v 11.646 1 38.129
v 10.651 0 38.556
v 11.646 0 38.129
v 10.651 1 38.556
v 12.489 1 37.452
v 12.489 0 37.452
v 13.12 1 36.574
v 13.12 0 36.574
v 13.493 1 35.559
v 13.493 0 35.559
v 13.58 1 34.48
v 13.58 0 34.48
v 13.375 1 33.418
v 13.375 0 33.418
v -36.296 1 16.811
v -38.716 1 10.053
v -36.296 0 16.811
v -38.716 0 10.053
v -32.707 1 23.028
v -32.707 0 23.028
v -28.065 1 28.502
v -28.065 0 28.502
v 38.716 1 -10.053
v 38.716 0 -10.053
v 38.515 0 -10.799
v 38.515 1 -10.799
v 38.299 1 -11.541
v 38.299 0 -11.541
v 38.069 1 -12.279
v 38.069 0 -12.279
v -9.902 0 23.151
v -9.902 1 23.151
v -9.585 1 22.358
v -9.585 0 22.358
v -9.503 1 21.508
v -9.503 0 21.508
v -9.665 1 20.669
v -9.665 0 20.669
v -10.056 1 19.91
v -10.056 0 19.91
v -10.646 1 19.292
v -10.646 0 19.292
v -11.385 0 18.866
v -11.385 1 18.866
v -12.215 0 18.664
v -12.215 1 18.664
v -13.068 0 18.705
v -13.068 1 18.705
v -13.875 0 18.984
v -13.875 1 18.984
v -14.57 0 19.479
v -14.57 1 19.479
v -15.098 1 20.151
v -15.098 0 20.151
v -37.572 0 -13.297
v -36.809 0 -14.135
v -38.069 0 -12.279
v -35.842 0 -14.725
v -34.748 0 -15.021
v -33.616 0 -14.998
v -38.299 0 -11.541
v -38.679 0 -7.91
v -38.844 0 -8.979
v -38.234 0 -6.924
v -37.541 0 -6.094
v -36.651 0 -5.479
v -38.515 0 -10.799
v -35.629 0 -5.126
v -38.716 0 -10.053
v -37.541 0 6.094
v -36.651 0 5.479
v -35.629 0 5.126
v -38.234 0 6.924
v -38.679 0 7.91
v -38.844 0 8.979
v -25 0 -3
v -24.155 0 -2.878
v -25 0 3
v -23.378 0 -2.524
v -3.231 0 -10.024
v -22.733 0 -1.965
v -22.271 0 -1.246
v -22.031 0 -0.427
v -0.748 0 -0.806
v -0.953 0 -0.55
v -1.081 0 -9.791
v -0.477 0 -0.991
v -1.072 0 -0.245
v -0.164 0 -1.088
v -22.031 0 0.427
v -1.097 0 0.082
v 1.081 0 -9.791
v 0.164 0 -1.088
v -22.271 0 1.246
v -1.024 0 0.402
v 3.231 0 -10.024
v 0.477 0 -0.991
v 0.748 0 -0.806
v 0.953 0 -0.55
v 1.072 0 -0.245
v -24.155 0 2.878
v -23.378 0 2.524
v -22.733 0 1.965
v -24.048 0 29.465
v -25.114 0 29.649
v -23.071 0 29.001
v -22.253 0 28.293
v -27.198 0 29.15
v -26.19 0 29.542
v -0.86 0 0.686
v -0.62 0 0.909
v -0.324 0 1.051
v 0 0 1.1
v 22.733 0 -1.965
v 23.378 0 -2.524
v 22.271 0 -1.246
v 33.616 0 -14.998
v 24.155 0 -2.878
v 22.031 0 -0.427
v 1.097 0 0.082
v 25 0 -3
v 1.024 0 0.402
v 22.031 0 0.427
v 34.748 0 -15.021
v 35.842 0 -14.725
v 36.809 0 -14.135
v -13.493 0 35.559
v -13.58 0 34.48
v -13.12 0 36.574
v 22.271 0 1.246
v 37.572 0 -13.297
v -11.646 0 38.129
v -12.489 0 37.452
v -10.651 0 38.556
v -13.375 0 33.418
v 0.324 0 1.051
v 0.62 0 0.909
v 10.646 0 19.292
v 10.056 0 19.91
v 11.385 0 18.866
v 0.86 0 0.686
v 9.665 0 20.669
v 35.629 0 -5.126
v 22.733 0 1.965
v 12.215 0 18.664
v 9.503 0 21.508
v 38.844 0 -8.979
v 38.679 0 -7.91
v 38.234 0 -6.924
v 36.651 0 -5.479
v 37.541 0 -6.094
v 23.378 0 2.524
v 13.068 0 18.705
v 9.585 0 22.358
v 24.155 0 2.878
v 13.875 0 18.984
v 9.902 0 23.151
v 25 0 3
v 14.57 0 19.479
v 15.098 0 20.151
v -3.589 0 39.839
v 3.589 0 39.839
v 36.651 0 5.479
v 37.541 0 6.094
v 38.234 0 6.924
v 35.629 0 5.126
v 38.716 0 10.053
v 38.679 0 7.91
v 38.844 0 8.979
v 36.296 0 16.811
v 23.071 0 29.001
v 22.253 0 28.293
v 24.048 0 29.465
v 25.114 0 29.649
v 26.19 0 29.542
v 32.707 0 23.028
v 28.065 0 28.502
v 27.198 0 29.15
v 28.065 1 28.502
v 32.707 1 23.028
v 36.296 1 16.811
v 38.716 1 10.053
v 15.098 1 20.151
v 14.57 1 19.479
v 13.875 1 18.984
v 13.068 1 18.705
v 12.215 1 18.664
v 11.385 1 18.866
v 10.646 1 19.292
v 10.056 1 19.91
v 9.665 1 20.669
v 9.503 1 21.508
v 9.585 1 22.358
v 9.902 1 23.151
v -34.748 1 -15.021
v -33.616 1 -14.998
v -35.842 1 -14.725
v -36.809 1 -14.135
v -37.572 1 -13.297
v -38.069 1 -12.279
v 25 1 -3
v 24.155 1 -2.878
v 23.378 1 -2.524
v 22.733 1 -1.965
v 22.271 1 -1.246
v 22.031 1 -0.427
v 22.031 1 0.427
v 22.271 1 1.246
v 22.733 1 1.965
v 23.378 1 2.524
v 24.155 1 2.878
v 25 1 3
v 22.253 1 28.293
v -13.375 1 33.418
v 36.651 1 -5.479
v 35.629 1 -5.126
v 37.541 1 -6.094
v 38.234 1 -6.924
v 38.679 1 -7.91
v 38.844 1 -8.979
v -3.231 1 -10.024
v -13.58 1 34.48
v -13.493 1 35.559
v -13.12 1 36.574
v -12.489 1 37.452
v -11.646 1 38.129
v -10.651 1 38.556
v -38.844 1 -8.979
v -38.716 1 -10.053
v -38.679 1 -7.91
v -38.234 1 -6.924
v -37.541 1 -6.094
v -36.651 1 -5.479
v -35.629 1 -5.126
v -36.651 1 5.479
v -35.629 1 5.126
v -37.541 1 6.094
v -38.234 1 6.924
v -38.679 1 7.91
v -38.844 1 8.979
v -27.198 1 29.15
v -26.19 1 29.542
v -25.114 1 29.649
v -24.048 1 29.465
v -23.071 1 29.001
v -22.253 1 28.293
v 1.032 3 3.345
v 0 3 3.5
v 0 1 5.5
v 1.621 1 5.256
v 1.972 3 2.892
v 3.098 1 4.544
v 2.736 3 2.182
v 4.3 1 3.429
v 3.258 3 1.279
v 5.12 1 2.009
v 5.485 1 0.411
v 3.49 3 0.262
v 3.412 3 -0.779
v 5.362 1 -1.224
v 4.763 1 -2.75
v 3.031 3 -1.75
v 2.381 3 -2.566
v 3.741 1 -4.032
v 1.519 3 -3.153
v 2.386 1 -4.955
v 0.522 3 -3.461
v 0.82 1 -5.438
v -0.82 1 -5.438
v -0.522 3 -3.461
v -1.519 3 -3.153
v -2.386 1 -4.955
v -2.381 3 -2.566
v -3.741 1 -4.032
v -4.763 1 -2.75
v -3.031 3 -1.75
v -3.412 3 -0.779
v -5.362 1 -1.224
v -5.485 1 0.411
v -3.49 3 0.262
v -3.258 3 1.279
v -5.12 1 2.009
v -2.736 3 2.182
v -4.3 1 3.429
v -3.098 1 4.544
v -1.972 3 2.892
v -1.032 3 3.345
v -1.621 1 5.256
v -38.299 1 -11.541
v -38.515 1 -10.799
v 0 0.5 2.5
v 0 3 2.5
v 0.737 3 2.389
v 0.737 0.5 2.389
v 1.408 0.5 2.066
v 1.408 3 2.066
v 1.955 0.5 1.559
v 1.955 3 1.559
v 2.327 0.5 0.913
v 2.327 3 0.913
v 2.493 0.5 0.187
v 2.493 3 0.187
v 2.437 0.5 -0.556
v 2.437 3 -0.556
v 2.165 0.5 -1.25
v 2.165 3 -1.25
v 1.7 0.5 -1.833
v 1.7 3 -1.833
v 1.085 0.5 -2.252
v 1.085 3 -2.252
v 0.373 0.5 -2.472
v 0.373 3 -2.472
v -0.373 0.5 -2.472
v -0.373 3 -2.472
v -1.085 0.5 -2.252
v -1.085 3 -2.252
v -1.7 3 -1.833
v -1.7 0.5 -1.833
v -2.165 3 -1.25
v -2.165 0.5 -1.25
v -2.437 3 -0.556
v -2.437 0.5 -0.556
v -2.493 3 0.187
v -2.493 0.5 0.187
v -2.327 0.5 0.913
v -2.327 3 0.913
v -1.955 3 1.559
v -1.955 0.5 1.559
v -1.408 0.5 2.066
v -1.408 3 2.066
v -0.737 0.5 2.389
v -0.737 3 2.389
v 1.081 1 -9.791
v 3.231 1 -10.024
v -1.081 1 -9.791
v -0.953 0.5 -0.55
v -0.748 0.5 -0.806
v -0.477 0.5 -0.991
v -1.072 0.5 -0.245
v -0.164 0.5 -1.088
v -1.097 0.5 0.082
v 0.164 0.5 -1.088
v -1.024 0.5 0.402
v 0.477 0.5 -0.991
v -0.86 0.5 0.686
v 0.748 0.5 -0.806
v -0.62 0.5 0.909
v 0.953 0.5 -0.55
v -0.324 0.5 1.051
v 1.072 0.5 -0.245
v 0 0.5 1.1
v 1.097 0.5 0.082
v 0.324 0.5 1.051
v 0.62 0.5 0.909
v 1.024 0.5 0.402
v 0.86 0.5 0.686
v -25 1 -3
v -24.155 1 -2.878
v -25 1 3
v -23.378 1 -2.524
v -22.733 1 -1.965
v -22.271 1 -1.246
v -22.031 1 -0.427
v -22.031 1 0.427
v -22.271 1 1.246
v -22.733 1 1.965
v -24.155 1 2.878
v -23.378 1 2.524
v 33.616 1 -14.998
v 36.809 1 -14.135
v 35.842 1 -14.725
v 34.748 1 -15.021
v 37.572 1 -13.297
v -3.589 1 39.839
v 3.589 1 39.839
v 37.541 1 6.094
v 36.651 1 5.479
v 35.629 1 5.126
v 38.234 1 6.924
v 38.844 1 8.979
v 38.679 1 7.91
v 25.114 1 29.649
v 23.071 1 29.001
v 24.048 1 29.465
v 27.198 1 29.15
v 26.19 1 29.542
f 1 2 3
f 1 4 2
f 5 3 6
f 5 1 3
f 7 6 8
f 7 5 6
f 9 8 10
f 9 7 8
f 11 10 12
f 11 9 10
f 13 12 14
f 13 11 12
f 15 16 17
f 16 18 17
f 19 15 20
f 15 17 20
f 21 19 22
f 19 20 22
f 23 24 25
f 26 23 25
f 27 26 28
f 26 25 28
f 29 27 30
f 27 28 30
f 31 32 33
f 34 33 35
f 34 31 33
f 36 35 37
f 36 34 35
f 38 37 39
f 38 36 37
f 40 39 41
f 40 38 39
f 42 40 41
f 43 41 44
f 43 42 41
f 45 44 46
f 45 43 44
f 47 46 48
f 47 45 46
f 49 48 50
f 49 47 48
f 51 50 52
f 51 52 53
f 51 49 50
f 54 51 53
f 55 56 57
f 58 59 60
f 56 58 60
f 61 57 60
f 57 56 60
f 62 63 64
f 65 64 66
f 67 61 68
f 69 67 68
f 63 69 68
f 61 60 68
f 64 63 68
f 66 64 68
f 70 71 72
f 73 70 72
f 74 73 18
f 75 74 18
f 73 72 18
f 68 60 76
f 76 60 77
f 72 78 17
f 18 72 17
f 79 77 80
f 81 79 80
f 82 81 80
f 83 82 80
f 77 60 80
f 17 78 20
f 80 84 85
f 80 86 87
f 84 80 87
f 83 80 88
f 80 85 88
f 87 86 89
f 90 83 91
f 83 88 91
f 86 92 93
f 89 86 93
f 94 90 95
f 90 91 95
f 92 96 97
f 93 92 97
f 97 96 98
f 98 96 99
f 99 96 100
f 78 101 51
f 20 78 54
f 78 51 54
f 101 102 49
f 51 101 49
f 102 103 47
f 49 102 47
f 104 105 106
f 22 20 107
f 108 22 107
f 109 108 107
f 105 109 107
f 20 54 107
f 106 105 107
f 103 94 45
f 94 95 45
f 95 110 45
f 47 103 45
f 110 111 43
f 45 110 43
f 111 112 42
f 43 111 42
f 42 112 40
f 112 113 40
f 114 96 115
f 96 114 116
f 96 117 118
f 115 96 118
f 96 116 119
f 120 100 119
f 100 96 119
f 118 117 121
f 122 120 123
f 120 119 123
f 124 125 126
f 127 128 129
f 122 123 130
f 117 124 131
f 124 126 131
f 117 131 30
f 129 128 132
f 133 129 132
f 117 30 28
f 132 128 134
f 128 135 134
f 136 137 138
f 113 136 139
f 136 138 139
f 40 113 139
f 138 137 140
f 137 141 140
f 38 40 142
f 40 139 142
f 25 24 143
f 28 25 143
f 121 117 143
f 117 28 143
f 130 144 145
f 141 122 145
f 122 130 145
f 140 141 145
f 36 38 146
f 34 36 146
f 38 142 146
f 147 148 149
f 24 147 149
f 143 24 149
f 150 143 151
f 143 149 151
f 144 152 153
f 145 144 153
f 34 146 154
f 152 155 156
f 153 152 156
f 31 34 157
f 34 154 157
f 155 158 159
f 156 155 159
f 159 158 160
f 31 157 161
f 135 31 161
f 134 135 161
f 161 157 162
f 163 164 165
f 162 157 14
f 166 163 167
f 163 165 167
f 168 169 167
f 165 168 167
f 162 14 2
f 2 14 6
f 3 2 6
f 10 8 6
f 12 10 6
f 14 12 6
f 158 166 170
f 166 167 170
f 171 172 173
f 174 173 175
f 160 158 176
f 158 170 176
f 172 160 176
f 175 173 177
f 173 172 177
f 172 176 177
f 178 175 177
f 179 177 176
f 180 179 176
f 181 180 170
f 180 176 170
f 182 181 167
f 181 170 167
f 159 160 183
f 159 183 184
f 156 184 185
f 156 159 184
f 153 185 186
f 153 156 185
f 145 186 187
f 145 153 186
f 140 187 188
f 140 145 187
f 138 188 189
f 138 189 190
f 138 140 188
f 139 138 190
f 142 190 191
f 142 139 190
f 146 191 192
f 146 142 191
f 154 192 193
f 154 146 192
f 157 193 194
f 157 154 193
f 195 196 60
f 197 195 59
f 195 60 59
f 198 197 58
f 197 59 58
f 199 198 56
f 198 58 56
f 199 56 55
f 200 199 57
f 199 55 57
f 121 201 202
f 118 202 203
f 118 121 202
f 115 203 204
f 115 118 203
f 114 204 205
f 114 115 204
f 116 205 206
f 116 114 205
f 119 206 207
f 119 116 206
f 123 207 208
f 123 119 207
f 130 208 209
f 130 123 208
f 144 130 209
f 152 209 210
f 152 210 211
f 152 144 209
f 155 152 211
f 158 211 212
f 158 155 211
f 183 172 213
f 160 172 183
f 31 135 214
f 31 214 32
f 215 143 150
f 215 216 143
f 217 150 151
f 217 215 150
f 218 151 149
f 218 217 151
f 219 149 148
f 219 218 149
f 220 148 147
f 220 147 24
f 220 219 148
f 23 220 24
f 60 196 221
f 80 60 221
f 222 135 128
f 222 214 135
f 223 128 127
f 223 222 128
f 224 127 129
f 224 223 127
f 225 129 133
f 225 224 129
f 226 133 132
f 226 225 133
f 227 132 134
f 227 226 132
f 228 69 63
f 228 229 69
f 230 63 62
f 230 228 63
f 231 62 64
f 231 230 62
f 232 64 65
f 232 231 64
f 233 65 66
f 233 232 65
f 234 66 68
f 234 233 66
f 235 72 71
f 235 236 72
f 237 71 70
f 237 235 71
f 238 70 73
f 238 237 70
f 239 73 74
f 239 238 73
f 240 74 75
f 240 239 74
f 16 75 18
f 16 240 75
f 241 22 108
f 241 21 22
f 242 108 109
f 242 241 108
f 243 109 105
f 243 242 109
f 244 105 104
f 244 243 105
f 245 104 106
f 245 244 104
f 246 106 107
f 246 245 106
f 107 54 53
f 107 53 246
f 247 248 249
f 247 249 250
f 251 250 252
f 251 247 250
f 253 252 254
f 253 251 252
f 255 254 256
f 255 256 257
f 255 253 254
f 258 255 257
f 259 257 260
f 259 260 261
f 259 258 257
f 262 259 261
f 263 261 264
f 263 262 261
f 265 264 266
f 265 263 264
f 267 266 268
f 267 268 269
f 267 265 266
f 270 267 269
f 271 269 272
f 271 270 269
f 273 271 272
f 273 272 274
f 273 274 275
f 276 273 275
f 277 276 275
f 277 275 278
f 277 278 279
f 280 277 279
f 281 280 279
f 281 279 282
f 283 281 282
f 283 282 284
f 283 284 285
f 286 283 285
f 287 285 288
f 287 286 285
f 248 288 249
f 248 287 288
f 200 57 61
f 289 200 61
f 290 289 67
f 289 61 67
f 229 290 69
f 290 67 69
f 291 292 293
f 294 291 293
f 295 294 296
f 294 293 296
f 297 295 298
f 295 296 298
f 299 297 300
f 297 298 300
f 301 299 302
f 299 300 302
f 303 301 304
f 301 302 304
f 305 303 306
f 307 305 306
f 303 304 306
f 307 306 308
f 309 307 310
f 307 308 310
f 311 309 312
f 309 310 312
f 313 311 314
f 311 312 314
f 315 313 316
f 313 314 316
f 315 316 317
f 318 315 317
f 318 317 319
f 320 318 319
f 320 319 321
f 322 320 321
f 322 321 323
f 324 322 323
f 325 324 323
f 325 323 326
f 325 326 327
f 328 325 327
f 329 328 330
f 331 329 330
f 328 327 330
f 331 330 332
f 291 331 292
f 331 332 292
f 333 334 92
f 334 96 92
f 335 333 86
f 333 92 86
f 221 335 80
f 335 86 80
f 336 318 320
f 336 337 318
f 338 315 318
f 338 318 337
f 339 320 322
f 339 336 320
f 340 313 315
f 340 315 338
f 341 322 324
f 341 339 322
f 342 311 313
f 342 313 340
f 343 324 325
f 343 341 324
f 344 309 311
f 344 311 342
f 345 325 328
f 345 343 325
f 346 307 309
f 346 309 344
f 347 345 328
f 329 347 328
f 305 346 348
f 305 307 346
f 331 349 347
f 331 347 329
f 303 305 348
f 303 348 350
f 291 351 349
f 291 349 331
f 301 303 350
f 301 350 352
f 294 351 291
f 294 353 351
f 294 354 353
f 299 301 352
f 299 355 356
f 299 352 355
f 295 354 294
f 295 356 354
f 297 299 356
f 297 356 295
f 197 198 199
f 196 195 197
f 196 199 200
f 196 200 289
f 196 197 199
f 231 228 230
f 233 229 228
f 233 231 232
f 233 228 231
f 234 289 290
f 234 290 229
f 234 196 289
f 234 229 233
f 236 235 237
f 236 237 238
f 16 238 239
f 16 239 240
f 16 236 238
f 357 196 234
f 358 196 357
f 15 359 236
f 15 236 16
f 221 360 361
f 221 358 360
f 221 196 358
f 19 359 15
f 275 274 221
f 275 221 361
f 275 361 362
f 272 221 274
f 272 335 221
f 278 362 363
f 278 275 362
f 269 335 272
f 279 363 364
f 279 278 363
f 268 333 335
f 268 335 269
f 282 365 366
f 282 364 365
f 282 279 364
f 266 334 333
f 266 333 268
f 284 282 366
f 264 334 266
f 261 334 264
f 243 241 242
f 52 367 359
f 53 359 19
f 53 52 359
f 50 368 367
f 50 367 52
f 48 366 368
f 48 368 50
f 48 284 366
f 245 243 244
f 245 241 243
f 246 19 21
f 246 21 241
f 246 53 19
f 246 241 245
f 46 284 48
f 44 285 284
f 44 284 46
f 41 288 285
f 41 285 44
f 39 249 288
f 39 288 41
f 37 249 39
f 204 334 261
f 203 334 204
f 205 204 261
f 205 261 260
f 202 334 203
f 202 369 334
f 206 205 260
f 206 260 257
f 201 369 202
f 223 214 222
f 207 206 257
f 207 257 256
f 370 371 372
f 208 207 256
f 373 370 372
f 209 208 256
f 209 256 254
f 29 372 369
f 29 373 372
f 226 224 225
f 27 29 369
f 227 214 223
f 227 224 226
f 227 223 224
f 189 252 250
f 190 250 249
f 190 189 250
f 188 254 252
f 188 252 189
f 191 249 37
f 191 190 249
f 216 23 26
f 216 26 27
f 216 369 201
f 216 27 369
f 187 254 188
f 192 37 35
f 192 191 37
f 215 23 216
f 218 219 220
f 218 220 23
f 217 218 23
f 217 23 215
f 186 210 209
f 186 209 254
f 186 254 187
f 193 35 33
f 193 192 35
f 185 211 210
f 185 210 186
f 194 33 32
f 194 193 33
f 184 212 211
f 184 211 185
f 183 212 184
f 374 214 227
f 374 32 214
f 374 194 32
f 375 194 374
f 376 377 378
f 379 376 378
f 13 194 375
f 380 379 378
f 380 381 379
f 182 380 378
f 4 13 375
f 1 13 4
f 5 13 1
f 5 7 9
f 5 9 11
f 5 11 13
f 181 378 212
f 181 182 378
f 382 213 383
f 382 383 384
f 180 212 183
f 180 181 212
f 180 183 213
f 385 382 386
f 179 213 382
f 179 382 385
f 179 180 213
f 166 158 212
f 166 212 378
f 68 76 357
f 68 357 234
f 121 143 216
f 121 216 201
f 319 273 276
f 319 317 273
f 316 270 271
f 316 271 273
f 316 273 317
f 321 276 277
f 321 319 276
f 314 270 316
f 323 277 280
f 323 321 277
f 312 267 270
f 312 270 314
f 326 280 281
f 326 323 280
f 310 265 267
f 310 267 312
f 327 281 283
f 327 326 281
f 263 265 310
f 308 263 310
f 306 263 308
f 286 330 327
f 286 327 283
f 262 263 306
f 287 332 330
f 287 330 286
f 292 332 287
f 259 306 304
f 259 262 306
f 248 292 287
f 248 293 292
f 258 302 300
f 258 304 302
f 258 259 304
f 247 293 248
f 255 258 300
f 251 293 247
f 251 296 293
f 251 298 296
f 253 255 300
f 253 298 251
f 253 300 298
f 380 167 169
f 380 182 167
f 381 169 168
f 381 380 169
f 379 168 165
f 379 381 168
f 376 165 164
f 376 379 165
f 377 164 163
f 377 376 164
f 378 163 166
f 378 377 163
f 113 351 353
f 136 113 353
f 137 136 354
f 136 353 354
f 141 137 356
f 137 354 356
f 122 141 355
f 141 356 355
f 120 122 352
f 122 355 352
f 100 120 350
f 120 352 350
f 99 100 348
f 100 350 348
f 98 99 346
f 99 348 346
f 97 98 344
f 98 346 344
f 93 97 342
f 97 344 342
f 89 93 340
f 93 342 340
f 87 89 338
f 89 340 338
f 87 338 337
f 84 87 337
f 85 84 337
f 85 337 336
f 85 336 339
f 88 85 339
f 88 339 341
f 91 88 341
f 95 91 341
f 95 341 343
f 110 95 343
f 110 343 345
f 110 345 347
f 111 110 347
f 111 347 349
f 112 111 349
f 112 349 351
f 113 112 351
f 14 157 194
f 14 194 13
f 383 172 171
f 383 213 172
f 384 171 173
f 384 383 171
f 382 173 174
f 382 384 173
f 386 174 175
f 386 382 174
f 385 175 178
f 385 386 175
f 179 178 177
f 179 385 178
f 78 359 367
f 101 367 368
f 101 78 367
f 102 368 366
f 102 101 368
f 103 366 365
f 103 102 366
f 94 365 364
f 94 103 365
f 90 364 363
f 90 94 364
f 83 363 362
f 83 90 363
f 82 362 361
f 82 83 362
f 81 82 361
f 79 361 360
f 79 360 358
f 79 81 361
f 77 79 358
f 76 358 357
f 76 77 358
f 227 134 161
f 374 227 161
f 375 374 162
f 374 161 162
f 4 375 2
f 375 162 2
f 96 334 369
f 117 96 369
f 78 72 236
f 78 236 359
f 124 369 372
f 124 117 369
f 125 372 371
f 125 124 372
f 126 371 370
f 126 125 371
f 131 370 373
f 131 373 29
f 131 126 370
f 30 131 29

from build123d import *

# Parameters (mm, degrees)
ESBO_O1_R                = 40
RESSALTO_EXTRUS_O1_DEPTH = 1
CORTE_EXTRUS_O1_START    = -10
CORTE_EXTRUS_O1_DEPTH    = 10
ESBO_O3_R                = 3.5
RESSALTO_EXTRUS_O2_DEPTH = 2
ESBO_O4_R                = 2.5
CORTE_EXTRUS_O2_DEPTH    = 2.5
CHANFRO1_SIZE            = 2
CORTE_EXTRUS_O3_DEPTH    = 3
FILETE1_R                = 4
ESBO_O6_R                = 1.1
CORTE_EXTRUS_O4_DEPTH    = 3
FILETE2_R                = 4
FILETE3_R                = 4
FILETE4_R                = 4
FILETE5_R                = 4
FILETE6_R                = 4
FILETE7_R                = 4
FILETE8_R                = 4
FILETE9_R                = 4
FILETE10_R               = 4
FILETE11_R               = 20


with BuildPart() as part:
    # Esboço1 → Ressalto-extrusão1 (new body)
    with BuildSketch(Plane(origin=(0, 0, 0), x_dir=(1, 0, 0), z_dir=(0, 1, 0))):
        with Locations(Location((0, 0, 0), (0, 0, 270))):
            Circle(ESBO_O1_R)
    extrude(amount=RESSALTO_EXTRUS_O1_DEPTH)

    # Esboço2 → Corte-extrusão1 (cut)
    with BuildSketch(Plane(origin=(0, 1, 0), x_dir=(1, 0, 0), z_dir=(0, 1, 0)).offset(CORTE_EXTRUS_O1_START)):
        with BuildLine():
            ThreePointArc((25, 3), (22, 0), (25, -3))
            Line((25, -3), (39.560670745, -5.912134149))
            ThreePointArc((39.560670745, -5.912134149), (40, 0), (39.560670745, 5.912134149))
            Line((39.560670745, 5.912134149), (25, 3))
        make_face()
        with BuildLine():
            ThreePointArc((-39.560670745, 5.912134149), (-40, 0), (-39.560670745, -5.912134149))
            Line((-39.560670745, -5.912134149), (-25, -3))
            ThreePointArc((-25, -3), (-22, 0), (-25, 3))
            Line((-25, 3), (-39.560670745, 5.912134149))
        make_face()
        with BuildLine():
            Line((9.901923789, -23.150635095), (14.660277009, -37.216612931))
            ThreePointArc((14.660277009, -37.216612931), (20, -34.641016151), (24.900393736, -31.304478782))
            Line((24.900393736, -31.304478782), (15.098076211, -20.150635095))
            ThreePointArc((15.098076211, -20.150635095), (11, -19.052558883), (9.901923789, -23.150635095))
        make_face()
        with BuildLine():
            ThreePointArc((-24.900393736, -31.304478782), (-20, -34.641016151), (-14.660277009, -37.216612931))
            Line((-14.660277009, -37.216612931), (-9.901923789, -23.150635095))
            ThreePointArc((-9.901923789, -23.150635095), (-11, -19.052558883), (-15.098076211, -20.150635095))
            Line((-15.098076211, -20.150635095), (-24.900393736, -31.304478782))
        make_face()
    extrude(amount=CORTE_EXTRUS_O1_DEPTH, mode=Mode.SUBTRACT)

    # Esboço3 → Ressalto-extrusão2 (add)
    with BuildSketch(Plane(origin=(0, 1, 0), x_dir=(1, 0, 0), z_dir=(0, 1, 0))):
        with Locations(Location((0, 0, 0), (0, 0, 270))):
            Circle(ESBO_O3_R)
    extrude(amount=RESSALTO_EXTRUS_O2_DEPTH)

    # Esboço4 → Corte-extrusão2 (cut)
    with BuildSketch(Plane(origin=(0, 3, 0), x_dir=(1, 0, 0), z_dir=(0, 1, 0))):
        with Locations(Location((0, 0, 0), (0, 0, 270))):
            Circle(ESBO_O4_R)
    extrude(amount=-CORTE_EXTRUS_O2_DEPTH, mode=Mode.SUBTRACT)

    # Chanfro1
    chanfro1_edges = [part.edges().sort_by_distance(p)[0] for p in [
        (0, 1, -3.5),
    ]]
    chamfer(chanfro1_edges, length=CHANFRO1_SIZE - 0.0001)  # a hair under: the kernel refuses the full size

    # Esboço5 → Corte-extrusão3 (cut)
    with BuildSketch(Plane(origin=(0, 1, 0), x_dir=(1, 0, 0), z_dir=(0, 1, 0))):
        Polygon((-36.862262331, 15.52976548), (0, 9.495011624), (36.862262331, 15.52976548), (36.862262331, 44.423786918), (-36.862262331, 44.423786918), align=None)
    extrude(amount=-CORTE_EXTRUS_O3_DEPTH, mode=Mode.SUBTRACT)

    # Filete1
    filete1_edges = [part.edges().sort_by_distance(p)[0] for p in [
        (36.862262331, 0.5, -15.52976548),
    ]]
    fillet(filete1_edges, radius=FILETE1_R)

    # Esboço6 → Corte-extrusão4 (cut)
    with BuildSketch(Plane(origin=(0, 0.5, 0), x_dir=(1, 0, 0), z_dir=(0, 1, 0))):
        with Locations(Location((0, 0, 0), (0, 0, 270))):
            Circle(ESBO_O6_R)
    extrude(amount=-CORTE_EXTRUS_O4_DEPTH, mode=Mode.SUBTRACT)

    # Filete2
    filete2_edges = [part.edges().sort_by_distance(p)[0] for p in [
        (-36.862262331, 0.5, -15.52976548),
    ]]
    fillet(filete2_edges, radius=FILETE2_R)

    # Filete3
    filete3_edges = [part.edges().sort_by_distance(p)[0] for p in [
        (-39.560670745, 0.5, -5.912134149),
    ]]
    fillet(filete3_edges, radius=FILETE3_R)

    # Filete4
    filete4_edges = [part.edges().sort_by_distance(p)[0] for p in [
        (-39.560670745, 0.5, 5.912134149),
    ]]
    fillet(filete4_edges, radius=FILETE4_R)

    # Filete5
    filete5_edges = [part.edges().sort_by_distance(p)[0] for p in [
        (-24.900393736, 0.5, 31.304478782),
    ]]
    fillet(filete5_edges, radius=FILETE5_R)

    # Filete6
    filete6_edges = [part.edges().sort_by_distance(p)[0] for p in [
        (-14.660277009, 0.5, 37.216612931),
    ]]
    fillet(filete6_edges, radius=FILETE6_R)

    # Filete7
    filete7_edges = [part.edges().sort_by_distance(p)[0] for p in [
        (14.660277009, 0.5, 37.216612931),
    ]]
    fillet(filete7_edges, radius=FILETE7_R)

    # Filete8
    filete8_edges = [part.edges().sort_by_distance(p)[0] for p in [
        (24.900393736, 0.5, 31.304478782),
    ]]
    fillet(filete8_edges, radius=FILETE8_R)

    # Filete9
    filete9_edges = [part.edges().sort_by_distance(p)[0] for p in [
        (39.560670745, 0.5, 5.912134149),
    ]]
    fillet(filete9_edges, radius=FILETE9_R)

    # Filete10
    filete10_edges = [part.edges().sort_by_distance(p)[0] for p in [
        (39.560670745, 0.5, -5.912134149),
    ]]
    fillet(filete10_edges, radius=FILETE10_R)

    # Filete11
    filete11_edges = [part.edges().sort_by_distance(p)[0] for p in [
        (0, 0.5, -9.495011624),
    ]]
    fillet(filete11_edges, radius=FILETE11_R)


solid = part.part
